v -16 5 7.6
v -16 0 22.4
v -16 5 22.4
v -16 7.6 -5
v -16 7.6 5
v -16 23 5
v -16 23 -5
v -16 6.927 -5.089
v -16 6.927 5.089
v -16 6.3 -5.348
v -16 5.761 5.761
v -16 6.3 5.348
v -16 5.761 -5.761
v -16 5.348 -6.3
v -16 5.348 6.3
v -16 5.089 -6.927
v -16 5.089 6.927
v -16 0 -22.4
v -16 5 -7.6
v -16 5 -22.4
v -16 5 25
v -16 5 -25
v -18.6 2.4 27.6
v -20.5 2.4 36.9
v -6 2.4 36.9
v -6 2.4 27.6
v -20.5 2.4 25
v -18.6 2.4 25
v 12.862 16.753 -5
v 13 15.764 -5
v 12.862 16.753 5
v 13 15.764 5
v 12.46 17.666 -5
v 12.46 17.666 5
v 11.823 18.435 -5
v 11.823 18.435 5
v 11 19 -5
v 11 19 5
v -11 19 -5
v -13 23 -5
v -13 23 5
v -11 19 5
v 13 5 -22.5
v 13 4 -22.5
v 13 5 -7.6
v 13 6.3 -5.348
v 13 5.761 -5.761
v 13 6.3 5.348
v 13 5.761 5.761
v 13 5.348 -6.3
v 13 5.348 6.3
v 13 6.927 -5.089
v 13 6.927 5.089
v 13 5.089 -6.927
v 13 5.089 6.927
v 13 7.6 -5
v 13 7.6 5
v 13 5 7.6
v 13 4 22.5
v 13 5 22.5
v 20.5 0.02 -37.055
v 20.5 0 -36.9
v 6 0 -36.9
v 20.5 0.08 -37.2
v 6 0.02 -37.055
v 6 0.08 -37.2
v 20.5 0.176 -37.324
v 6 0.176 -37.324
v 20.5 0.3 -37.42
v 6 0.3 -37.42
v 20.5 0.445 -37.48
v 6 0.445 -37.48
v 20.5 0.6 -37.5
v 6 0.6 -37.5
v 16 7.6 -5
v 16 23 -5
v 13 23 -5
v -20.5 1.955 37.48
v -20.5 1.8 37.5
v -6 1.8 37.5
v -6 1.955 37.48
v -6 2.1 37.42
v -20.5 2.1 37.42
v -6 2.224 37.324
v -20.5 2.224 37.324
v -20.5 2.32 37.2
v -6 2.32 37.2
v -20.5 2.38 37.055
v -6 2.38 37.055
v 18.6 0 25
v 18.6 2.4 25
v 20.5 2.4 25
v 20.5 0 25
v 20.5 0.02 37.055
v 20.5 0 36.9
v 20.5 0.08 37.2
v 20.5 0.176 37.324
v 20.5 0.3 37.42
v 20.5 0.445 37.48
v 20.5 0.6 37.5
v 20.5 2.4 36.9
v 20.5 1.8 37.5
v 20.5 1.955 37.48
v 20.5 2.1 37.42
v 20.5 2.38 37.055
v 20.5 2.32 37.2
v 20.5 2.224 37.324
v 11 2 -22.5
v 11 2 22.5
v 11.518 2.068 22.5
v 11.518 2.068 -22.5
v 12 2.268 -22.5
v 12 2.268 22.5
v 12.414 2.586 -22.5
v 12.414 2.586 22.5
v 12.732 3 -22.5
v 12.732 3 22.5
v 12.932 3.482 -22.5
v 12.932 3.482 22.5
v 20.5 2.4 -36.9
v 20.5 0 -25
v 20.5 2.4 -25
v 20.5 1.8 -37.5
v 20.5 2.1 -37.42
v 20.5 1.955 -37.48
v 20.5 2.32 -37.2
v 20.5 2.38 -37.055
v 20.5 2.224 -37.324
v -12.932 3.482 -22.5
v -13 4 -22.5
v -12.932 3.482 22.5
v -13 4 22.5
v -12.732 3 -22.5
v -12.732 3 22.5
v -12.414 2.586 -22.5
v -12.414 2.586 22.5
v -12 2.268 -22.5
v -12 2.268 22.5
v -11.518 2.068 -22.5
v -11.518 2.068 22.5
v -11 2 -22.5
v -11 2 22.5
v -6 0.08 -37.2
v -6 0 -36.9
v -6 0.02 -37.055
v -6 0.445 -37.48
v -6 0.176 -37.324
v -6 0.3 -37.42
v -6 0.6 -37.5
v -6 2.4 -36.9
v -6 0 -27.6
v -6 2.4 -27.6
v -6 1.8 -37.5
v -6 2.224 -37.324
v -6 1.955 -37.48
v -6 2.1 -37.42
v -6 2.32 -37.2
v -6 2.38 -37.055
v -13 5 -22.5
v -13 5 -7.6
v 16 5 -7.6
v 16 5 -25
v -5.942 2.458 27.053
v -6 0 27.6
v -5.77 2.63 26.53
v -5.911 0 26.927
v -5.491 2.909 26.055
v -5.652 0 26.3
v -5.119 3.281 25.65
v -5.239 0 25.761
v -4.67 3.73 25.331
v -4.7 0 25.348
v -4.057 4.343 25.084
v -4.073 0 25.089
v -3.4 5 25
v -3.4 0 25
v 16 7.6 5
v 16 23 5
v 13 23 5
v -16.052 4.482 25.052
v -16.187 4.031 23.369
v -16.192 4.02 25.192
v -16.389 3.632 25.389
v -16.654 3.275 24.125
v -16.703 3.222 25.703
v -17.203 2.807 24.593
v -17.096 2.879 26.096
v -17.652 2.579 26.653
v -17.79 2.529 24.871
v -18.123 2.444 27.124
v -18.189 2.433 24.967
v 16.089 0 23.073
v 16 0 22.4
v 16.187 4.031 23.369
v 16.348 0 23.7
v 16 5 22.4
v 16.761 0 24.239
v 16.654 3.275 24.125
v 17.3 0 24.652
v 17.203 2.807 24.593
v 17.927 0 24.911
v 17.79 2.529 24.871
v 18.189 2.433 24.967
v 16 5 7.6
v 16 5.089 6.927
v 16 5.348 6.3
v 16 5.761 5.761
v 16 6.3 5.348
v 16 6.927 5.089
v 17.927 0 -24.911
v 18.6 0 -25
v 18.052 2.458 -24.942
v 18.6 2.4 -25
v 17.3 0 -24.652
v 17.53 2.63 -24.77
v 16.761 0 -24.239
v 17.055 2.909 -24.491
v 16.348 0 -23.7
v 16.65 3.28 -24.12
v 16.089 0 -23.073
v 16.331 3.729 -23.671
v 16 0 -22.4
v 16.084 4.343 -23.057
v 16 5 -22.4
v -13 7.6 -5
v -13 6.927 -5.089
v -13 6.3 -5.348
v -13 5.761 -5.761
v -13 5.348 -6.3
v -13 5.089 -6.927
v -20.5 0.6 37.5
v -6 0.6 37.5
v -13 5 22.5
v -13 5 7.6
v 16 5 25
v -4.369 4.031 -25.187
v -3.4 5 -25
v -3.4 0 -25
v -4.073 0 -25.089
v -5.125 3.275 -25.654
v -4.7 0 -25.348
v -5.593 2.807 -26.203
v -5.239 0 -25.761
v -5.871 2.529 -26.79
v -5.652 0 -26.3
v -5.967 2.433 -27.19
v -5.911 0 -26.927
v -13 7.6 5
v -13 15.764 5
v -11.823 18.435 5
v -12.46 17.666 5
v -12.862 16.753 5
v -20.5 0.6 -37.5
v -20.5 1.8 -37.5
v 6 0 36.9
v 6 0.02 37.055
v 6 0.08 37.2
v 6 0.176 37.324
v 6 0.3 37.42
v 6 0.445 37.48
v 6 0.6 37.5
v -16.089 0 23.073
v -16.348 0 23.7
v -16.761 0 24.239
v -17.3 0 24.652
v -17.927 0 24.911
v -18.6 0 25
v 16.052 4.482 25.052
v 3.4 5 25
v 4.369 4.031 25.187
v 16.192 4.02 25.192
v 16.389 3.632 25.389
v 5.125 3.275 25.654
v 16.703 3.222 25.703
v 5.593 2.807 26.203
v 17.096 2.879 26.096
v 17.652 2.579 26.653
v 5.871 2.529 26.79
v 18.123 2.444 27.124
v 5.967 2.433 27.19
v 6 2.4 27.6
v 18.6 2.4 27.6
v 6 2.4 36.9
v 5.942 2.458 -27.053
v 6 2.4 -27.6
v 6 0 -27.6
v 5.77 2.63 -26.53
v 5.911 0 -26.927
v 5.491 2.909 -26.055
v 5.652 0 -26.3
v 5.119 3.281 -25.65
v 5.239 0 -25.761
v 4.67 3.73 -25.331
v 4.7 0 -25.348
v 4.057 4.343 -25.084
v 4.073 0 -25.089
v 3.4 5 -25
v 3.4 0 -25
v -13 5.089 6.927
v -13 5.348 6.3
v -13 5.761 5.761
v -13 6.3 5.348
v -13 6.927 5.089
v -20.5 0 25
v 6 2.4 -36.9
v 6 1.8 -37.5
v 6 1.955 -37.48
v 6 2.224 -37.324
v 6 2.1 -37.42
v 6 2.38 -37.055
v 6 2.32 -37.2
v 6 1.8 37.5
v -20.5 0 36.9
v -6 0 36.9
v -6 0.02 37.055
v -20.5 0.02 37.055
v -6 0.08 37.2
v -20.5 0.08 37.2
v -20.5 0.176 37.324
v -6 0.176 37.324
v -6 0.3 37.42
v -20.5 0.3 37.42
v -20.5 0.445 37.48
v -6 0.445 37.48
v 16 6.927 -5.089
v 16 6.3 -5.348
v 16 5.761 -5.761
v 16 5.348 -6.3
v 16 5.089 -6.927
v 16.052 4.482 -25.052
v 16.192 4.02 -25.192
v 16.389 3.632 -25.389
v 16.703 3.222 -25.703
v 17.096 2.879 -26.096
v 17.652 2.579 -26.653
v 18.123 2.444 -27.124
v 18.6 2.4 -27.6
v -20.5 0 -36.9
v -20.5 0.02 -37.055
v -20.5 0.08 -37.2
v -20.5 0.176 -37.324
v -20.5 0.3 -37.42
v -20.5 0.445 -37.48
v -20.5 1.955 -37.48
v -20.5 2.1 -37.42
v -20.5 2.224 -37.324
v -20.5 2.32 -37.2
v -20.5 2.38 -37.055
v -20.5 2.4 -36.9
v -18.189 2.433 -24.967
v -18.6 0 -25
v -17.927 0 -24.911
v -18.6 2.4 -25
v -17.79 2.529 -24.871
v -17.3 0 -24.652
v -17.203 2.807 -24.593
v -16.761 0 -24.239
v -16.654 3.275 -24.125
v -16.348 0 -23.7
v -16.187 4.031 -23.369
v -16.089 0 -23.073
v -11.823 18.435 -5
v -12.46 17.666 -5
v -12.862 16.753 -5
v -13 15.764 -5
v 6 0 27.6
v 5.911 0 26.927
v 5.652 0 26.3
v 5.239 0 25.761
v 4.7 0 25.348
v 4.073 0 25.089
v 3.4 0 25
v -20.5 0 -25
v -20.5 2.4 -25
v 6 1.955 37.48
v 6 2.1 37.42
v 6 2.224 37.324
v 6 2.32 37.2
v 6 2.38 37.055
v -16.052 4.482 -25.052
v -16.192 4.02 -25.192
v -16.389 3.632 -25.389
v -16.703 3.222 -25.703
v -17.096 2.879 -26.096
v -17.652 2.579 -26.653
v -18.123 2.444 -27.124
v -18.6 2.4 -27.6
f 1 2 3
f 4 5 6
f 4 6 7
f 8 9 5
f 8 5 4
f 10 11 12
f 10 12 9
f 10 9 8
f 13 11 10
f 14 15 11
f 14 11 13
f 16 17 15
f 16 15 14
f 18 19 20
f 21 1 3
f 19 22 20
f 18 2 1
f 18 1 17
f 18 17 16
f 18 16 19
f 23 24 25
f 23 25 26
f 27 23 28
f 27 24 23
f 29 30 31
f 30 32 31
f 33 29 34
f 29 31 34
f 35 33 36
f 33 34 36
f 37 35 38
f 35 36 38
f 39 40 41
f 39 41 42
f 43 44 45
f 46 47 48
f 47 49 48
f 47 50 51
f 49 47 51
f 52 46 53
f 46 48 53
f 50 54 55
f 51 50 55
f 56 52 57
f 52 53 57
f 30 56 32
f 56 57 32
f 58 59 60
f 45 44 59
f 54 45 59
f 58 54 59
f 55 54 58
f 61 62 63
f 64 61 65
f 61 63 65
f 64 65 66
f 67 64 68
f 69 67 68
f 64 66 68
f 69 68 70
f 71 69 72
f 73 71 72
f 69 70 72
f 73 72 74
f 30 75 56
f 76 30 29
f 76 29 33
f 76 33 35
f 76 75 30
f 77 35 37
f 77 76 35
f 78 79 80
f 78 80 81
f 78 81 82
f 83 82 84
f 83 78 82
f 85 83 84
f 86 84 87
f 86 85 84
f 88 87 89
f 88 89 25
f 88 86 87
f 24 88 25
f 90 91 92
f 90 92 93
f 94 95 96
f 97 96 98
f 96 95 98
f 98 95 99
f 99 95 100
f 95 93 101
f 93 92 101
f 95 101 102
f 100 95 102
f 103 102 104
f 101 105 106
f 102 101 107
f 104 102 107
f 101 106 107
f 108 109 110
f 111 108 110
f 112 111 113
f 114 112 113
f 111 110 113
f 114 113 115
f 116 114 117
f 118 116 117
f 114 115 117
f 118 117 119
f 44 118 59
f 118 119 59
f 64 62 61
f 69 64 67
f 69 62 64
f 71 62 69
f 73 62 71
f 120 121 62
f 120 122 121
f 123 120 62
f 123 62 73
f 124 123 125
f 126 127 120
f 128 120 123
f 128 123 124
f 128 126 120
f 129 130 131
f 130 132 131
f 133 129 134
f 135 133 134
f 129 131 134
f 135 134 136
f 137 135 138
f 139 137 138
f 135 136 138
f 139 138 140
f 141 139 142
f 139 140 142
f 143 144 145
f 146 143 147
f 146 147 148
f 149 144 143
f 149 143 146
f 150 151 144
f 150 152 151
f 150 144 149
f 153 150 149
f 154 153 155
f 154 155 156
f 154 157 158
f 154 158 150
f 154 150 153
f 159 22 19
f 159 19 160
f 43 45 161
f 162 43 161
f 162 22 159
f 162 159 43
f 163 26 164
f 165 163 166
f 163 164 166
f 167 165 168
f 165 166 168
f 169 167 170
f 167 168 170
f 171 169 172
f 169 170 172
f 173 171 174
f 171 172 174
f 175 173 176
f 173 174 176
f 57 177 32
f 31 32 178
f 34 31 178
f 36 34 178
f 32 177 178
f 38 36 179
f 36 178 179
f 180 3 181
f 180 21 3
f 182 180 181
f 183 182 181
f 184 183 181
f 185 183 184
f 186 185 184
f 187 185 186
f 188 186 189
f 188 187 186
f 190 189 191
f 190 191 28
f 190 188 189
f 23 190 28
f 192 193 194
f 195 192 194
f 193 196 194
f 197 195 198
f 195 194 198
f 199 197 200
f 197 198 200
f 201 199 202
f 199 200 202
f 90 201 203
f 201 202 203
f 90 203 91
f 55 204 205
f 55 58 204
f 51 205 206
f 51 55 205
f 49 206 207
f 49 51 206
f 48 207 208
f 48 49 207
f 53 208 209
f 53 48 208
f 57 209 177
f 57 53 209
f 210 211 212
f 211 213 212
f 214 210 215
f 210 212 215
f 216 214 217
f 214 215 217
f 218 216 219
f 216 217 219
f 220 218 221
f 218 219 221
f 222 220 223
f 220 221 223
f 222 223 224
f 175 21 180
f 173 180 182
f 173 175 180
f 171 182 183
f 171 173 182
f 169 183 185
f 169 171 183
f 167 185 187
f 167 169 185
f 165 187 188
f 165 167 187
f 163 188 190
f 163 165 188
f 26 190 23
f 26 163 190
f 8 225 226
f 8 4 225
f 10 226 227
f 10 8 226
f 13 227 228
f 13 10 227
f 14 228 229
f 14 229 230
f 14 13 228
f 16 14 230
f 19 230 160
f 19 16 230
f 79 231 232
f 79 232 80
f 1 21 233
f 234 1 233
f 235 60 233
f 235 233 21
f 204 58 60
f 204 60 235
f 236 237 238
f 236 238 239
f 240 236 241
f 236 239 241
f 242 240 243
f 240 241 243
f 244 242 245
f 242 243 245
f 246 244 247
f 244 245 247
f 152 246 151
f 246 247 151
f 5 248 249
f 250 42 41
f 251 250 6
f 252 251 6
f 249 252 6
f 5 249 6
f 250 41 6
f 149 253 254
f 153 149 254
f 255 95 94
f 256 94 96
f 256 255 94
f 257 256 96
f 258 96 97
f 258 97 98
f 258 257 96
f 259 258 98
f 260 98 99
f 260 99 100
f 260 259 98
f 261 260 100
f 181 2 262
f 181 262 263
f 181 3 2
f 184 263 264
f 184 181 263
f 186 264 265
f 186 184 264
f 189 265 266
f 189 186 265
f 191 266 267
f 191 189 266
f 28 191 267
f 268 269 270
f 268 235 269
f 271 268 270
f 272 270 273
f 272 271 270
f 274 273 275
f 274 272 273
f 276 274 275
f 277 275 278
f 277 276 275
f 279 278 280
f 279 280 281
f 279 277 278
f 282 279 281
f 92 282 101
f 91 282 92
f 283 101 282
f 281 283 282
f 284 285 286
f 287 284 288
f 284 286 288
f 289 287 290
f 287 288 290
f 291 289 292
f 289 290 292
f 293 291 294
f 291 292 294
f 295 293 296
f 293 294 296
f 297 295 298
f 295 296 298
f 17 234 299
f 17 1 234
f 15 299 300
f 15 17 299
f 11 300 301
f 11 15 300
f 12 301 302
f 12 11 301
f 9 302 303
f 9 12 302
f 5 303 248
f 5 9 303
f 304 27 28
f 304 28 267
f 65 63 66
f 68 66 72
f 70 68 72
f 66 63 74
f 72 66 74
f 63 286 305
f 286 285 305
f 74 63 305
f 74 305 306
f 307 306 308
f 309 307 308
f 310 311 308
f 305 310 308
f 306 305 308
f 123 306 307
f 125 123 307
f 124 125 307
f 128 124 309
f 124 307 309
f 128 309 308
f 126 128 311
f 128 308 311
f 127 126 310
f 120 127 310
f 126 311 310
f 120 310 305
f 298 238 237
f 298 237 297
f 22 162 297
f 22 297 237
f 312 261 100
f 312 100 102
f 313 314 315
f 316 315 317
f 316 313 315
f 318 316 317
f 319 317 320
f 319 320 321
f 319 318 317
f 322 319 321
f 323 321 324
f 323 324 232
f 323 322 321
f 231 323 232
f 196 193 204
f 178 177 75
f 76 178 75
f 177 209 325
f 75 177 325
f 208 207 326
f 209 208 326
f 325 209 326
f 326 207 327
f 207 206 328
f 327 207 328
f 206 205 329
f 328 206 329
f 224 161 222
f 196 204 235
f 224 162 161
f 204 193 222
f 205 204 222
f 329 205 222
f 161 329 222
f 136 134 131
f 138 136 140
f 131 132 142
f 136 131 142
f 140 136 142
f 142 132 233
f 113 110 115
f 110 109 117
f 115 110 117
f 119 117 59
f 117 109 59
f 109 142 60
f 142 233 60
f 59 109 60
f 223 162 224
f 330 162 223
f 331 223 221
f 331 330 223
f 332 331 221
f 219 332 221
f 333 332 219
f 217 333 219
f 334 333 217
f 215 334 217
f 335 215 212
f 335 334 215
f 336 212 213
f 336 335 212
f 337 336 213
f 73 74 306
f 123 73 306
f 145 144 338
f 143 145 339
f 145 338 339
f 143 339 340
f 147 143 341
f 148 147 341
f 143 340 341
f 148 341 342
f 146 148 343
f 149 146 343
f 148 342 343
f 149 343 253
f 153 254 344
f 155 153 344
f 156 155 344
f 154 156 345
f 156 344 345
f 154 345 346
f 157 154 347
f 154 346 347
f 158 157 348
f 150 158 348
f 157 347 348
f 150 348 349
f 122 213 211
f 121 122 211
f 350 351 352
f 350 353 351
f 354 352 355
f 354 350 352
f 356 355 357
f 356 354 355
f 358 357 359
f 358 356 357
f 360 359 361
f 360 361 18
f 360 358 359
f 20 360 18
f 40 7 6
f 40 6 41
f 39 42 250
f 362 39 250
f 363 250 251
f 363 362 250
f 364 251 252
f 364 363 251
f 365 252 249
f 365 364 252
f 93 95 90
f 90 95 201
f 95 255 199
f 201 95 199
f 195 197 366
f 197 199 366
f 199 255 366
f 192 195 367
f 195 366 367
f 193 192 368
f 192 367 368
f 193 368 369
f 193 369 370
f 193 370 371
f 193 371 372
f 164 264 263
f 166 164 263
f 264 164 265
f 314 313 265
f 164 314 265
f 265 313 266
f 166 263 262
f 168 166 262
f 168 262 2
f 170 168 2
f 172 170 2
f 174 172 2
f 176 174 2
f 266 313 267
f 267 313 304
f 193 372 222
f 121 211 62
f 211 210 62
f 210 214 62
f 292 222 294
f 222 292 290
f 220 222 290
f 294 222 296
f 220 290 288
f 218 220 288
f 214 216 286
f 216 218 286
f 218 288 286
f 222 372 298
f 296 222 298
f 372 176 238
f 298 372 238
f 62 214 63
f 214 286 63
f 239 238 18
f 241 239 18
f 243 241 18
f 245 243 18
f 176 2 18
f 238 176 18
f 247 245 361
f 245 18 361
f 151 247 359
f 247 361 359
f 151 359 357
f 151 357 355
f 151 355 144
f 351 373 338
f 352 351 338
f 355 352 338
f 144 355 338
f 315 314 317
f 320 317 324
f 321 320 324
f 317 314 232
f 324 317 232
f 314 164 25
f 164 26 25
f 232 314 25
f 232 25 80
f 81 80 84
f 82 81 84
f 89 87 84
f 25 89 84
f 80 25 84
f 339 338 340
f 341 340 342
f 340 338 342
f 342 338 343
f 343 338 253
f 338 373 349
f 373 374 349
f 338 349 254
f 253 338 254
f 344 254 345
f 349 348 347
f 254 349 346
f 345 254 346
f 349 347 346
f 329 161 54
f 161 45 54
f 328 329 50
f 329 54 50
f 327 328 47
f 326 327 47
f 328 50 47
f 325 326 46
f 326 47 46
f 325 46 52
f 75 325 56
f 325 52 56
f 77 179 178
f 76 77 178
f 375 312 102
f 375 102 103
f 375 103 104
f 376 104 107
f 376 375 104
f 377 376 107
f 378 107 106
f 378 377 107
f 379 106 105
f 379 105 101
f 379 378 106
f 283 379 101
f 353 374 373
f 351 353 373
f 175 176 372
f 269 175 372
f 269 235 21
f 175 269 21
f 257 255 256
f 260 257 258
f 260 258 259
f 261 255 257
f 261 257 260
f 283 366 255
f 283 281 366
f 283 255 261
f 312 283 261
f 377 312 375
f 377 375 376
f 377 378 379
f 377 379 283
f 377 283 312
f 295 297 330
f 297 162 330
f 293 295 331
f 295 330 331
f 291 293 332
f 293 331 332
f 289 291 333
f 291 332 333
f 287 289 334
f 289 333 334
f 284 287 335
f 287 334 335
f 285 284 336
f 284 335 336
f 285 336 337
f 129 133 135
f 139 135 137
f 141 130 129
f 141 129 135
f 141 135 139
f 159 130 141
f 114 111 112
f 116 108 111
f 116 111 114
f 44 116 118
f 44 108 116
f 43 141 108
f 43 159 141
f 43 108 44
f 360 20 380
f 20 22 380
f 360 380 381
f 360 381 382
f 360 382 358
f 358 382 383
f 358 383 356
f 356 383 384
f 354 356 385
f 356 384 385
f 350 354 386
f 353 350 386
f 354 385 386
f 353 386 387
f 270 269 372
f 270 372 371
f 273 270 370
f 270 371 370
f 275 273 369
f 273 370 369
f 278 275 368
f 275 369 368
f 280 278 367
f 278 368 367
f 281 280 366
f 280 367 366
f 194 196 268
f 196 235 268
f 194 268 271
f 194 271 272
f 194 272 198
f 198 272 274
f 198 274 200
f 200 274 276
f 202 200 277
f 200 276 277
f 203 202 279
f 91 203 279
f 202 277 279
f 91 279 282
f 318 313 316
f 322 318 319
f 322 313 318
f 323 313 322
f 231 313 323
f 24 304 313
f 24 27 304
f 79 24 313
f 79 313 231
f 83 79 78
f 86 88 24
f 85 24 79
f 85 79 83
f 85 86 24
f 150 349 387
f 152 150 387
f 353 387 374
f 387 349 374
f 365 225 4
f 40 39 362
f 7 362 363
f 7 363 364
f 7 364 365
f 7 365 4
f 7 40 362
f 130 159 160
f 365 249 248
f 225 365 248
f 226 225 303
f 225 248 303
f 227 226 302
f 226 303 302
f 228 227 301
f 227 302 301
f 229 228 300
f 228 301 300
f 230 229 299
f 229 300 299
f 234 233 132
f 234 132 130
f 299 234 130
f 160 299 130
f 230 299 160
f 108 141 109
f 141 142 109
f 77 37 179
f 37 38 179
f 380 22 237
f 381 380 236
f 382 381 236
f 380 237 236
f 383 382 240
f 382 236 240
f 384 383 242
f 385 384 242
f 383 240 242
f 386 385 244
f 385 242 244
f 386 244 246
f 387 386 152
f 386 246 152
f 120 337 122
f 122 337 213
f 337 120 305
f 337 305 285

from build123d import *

# Parameters (mm, degrees)
SKETCH1_W                = 32
SKETCH1_H                = 50
BOSS_EXTRUDE1_DEPTH      = 5
CUT_EXTRUDE1_DEPTH       = 22.5
BOSS_EXTRUDE2_DEPTH      = 5
BOSS_EXTRUDE3_DEPTH      = 10
BOSS_EXTRUDE3_DEPTH_BACK = 4.5
BOSS_EXTRUDE3_START      = -16
BOSS_EXTRUDE4_START      = 6
BOSS_EXTRUDE4_DEPTH      = 14.5
FILLET1_R                = 2.6
FILLET2_R                = 2.6


with BuildPart() as part:
    # Sketch1 → Boss-Extrude1 (new body)
    with BuildSketch(Plane(origin=(0, 0, 0), x_dir=(1, 0, 0), z_dir=(0, 1, 0))):
        Rectangle(SKETCH1_W, SKETCH1_H)
    extrude(amount=BOSS_EXTRUDE1_DEPTH)

    # Sketch2 → Cut-Extrude1 (cut, symmetric)
    with BuildSketch(Plane.XY):
        with BuildLine():
            Line((-11, 2), (11, 2))
            ThreePointArc((11, 2), (12.414213562, 2.585786438), (13, 4))
            Line((13, 4), (13, 5))
            Line((13, 5), (-13, 5))
            Line((-13, 5), (-13, 4))
            ThreePointArc((-13, 4), (-12.414213562, 2.585786438), (-11, 2))
        make_face()
    extrude(amount=CUT_EXTRUDE1_DEPTH, both=True, mode=Mode.SUBTRACT)

    # Sketch3 → Boss-Extrude2 (add, symmetric)
    with BuildSketch(Plane.XY):
        with BuildLine():
            Line((-16, 5), (-16, 23))
            Line((-16, 23), (-13, 23))
            Line((-13, 23), (-11, 19))
            ThreePointArc((-11, 19), (-12.459649548, 17.666045055), (-13, 15.763932023))
            Line((-13, 15.763932023), (-13, 5))
            Line((-13, 5), (-16, 5))
        make_face()
        with BuildLine():
            Line((16, 5), (13, 5))
            Line((13, 5), (13, 15.763932023))
            ThreePointArc((13, 15.763932023), (12.459649548, 17.666045055), (11, 19))
            Line((11, 19), (13, 23))
            Line((13, 23), (16, 23))
            Line((16, 23), (16, 5))
        make_face()
    extrude(amount=BOSS_EXTRUDE2_DEPTH, both=True)

    # Sketch4 → Boss-Extrude3 (add, two sides: drawn at the far end of the back side and taken through both)
    with BuildSketch(Plane(origin=(0, 0, 0), x_dir=(0, 0, -1), z_dir=(1, 0, 0)).offset(BOSS_EXTRUDE3_START - BOSS_EXTRUDE3_DEPTH_BACK)):
        with BuildLine():
            Line((25, 0), (36.9, 0))
            ThreePointArc((36.9, 0), (37.324264069, 0.175735931), (37.5, 0.6))
            Line((37.5, 0.6), (37.5, 1.8))
            ThreePointArc((37.5, 1.8), (37.324264069, 2.224264069), (36.9, 2.4))
            Line((36.9, 2.4), (25, 2.4))
            Line((25, 2.4), (25, 0))
        make_face()
        with BuildLine():
            Line((-25, 0), (-36.9, 0))
            ThreePointArc((-36.9, 0), (-37.324264069, 0.175735931), (-37.5, 0.6))
            Line((-37.5, 0.6), (-37.5, 1.8))
            ThreePointArc((-37.5, 1.8), (-37.324264069, 2.224264069), (-36.9, 2.4))
            Line((-36.9, 2.4), (-25, 2.4))
            Line((-25, 2.4), (-25, 0))
        make_face()
    extrude(amount=BOSS_EXTRUDE3_DEPTH + BOSS_EXTRUDE3_DEPTH_BACK)

    # Sketch4<2> → Boss-Extrude4 (add)
    with BuildSketch(Plane(origin=(0, 0, 0), x_dir=(0, 0, -1), z_dir=(1, 0, 0)).offset(BOSS_EXTRUDE4_START)):
        with BuildLine():
            Line((25, 0), (36.9, 0))
            ThreePointArc((36.9, 0), (37.324264069, 0.175735931), (37.5, 0.6))
            Line((37.5, 0.6), (37.5, 1.8))
            ThreePointArc((37.5, 1.8), (37.324264069, 2.224264069), (36.9, 2.4))
            Line((36.9, 2.4), (25, 2.4))
            Line((25, 2.4), (25, 0))
        make_face()
        with BuildLine():
            Line((-25, 0), (-36.9, 0))
            ThreePointArc((-36.9, 0), (-37.324264069, 0.175735931), (-37.5, 0.6))
            Line((-37.5, 0.6), (-37.5, 1.8))
            ThreePointArc((-37.5, 1.8), (-37.324264069, 2.224264069), (-36.9, 2.4))
            Line((-36.9, 2.4), (-25, 2.4))
            Line((-25, 2.4), (-25, 0))
        make_face()
    extrude(amount=BOSS_EXTRUDE4_DEPTH)

    # Fillet1
    fillet1_edges = [part.edges().sort_by_distance(p)[0] for p in [
        (-14.5, 5, 5),
        (14.5, 5, 5),
        (-14.5, 5, -5),
        (14.5, 5, -5),
        (-6, 1.2, -25),
        (6, 1.2, -25),
        (6, 1.2, 25),
        (-6, 1.2, 25),
        (-11, 2.4, -25),
        (11, 2.4, -25),
        (-11, 2.4, 25),
        (11, 2.4, 25),
    ]]
    fillet(fillet1_edges, radius=FILLET1_R - 0.0001)  # a hair under: the kernel refuses the full size

    # Fillet2
    fillet2_edges = [part.edges().sort_by_distance(p)[0] for p in [
        (-16, 2.4, 26.29995),
        (-16, 2.4, -26.29995),
        (-16, 1.2, 25),
        (-16, 1.2, -25),
        (16, 1.2, -25),
        (16, 2.4, -26.29995),
        (16, 2.4, 26.29995),
        (16, 1.2, 25),
    ]]
    fillet(fillet2_edges, radius=FILLET2_R - 0.0004)  # a hair under: the kernel refuses the full size


solid = part.part
